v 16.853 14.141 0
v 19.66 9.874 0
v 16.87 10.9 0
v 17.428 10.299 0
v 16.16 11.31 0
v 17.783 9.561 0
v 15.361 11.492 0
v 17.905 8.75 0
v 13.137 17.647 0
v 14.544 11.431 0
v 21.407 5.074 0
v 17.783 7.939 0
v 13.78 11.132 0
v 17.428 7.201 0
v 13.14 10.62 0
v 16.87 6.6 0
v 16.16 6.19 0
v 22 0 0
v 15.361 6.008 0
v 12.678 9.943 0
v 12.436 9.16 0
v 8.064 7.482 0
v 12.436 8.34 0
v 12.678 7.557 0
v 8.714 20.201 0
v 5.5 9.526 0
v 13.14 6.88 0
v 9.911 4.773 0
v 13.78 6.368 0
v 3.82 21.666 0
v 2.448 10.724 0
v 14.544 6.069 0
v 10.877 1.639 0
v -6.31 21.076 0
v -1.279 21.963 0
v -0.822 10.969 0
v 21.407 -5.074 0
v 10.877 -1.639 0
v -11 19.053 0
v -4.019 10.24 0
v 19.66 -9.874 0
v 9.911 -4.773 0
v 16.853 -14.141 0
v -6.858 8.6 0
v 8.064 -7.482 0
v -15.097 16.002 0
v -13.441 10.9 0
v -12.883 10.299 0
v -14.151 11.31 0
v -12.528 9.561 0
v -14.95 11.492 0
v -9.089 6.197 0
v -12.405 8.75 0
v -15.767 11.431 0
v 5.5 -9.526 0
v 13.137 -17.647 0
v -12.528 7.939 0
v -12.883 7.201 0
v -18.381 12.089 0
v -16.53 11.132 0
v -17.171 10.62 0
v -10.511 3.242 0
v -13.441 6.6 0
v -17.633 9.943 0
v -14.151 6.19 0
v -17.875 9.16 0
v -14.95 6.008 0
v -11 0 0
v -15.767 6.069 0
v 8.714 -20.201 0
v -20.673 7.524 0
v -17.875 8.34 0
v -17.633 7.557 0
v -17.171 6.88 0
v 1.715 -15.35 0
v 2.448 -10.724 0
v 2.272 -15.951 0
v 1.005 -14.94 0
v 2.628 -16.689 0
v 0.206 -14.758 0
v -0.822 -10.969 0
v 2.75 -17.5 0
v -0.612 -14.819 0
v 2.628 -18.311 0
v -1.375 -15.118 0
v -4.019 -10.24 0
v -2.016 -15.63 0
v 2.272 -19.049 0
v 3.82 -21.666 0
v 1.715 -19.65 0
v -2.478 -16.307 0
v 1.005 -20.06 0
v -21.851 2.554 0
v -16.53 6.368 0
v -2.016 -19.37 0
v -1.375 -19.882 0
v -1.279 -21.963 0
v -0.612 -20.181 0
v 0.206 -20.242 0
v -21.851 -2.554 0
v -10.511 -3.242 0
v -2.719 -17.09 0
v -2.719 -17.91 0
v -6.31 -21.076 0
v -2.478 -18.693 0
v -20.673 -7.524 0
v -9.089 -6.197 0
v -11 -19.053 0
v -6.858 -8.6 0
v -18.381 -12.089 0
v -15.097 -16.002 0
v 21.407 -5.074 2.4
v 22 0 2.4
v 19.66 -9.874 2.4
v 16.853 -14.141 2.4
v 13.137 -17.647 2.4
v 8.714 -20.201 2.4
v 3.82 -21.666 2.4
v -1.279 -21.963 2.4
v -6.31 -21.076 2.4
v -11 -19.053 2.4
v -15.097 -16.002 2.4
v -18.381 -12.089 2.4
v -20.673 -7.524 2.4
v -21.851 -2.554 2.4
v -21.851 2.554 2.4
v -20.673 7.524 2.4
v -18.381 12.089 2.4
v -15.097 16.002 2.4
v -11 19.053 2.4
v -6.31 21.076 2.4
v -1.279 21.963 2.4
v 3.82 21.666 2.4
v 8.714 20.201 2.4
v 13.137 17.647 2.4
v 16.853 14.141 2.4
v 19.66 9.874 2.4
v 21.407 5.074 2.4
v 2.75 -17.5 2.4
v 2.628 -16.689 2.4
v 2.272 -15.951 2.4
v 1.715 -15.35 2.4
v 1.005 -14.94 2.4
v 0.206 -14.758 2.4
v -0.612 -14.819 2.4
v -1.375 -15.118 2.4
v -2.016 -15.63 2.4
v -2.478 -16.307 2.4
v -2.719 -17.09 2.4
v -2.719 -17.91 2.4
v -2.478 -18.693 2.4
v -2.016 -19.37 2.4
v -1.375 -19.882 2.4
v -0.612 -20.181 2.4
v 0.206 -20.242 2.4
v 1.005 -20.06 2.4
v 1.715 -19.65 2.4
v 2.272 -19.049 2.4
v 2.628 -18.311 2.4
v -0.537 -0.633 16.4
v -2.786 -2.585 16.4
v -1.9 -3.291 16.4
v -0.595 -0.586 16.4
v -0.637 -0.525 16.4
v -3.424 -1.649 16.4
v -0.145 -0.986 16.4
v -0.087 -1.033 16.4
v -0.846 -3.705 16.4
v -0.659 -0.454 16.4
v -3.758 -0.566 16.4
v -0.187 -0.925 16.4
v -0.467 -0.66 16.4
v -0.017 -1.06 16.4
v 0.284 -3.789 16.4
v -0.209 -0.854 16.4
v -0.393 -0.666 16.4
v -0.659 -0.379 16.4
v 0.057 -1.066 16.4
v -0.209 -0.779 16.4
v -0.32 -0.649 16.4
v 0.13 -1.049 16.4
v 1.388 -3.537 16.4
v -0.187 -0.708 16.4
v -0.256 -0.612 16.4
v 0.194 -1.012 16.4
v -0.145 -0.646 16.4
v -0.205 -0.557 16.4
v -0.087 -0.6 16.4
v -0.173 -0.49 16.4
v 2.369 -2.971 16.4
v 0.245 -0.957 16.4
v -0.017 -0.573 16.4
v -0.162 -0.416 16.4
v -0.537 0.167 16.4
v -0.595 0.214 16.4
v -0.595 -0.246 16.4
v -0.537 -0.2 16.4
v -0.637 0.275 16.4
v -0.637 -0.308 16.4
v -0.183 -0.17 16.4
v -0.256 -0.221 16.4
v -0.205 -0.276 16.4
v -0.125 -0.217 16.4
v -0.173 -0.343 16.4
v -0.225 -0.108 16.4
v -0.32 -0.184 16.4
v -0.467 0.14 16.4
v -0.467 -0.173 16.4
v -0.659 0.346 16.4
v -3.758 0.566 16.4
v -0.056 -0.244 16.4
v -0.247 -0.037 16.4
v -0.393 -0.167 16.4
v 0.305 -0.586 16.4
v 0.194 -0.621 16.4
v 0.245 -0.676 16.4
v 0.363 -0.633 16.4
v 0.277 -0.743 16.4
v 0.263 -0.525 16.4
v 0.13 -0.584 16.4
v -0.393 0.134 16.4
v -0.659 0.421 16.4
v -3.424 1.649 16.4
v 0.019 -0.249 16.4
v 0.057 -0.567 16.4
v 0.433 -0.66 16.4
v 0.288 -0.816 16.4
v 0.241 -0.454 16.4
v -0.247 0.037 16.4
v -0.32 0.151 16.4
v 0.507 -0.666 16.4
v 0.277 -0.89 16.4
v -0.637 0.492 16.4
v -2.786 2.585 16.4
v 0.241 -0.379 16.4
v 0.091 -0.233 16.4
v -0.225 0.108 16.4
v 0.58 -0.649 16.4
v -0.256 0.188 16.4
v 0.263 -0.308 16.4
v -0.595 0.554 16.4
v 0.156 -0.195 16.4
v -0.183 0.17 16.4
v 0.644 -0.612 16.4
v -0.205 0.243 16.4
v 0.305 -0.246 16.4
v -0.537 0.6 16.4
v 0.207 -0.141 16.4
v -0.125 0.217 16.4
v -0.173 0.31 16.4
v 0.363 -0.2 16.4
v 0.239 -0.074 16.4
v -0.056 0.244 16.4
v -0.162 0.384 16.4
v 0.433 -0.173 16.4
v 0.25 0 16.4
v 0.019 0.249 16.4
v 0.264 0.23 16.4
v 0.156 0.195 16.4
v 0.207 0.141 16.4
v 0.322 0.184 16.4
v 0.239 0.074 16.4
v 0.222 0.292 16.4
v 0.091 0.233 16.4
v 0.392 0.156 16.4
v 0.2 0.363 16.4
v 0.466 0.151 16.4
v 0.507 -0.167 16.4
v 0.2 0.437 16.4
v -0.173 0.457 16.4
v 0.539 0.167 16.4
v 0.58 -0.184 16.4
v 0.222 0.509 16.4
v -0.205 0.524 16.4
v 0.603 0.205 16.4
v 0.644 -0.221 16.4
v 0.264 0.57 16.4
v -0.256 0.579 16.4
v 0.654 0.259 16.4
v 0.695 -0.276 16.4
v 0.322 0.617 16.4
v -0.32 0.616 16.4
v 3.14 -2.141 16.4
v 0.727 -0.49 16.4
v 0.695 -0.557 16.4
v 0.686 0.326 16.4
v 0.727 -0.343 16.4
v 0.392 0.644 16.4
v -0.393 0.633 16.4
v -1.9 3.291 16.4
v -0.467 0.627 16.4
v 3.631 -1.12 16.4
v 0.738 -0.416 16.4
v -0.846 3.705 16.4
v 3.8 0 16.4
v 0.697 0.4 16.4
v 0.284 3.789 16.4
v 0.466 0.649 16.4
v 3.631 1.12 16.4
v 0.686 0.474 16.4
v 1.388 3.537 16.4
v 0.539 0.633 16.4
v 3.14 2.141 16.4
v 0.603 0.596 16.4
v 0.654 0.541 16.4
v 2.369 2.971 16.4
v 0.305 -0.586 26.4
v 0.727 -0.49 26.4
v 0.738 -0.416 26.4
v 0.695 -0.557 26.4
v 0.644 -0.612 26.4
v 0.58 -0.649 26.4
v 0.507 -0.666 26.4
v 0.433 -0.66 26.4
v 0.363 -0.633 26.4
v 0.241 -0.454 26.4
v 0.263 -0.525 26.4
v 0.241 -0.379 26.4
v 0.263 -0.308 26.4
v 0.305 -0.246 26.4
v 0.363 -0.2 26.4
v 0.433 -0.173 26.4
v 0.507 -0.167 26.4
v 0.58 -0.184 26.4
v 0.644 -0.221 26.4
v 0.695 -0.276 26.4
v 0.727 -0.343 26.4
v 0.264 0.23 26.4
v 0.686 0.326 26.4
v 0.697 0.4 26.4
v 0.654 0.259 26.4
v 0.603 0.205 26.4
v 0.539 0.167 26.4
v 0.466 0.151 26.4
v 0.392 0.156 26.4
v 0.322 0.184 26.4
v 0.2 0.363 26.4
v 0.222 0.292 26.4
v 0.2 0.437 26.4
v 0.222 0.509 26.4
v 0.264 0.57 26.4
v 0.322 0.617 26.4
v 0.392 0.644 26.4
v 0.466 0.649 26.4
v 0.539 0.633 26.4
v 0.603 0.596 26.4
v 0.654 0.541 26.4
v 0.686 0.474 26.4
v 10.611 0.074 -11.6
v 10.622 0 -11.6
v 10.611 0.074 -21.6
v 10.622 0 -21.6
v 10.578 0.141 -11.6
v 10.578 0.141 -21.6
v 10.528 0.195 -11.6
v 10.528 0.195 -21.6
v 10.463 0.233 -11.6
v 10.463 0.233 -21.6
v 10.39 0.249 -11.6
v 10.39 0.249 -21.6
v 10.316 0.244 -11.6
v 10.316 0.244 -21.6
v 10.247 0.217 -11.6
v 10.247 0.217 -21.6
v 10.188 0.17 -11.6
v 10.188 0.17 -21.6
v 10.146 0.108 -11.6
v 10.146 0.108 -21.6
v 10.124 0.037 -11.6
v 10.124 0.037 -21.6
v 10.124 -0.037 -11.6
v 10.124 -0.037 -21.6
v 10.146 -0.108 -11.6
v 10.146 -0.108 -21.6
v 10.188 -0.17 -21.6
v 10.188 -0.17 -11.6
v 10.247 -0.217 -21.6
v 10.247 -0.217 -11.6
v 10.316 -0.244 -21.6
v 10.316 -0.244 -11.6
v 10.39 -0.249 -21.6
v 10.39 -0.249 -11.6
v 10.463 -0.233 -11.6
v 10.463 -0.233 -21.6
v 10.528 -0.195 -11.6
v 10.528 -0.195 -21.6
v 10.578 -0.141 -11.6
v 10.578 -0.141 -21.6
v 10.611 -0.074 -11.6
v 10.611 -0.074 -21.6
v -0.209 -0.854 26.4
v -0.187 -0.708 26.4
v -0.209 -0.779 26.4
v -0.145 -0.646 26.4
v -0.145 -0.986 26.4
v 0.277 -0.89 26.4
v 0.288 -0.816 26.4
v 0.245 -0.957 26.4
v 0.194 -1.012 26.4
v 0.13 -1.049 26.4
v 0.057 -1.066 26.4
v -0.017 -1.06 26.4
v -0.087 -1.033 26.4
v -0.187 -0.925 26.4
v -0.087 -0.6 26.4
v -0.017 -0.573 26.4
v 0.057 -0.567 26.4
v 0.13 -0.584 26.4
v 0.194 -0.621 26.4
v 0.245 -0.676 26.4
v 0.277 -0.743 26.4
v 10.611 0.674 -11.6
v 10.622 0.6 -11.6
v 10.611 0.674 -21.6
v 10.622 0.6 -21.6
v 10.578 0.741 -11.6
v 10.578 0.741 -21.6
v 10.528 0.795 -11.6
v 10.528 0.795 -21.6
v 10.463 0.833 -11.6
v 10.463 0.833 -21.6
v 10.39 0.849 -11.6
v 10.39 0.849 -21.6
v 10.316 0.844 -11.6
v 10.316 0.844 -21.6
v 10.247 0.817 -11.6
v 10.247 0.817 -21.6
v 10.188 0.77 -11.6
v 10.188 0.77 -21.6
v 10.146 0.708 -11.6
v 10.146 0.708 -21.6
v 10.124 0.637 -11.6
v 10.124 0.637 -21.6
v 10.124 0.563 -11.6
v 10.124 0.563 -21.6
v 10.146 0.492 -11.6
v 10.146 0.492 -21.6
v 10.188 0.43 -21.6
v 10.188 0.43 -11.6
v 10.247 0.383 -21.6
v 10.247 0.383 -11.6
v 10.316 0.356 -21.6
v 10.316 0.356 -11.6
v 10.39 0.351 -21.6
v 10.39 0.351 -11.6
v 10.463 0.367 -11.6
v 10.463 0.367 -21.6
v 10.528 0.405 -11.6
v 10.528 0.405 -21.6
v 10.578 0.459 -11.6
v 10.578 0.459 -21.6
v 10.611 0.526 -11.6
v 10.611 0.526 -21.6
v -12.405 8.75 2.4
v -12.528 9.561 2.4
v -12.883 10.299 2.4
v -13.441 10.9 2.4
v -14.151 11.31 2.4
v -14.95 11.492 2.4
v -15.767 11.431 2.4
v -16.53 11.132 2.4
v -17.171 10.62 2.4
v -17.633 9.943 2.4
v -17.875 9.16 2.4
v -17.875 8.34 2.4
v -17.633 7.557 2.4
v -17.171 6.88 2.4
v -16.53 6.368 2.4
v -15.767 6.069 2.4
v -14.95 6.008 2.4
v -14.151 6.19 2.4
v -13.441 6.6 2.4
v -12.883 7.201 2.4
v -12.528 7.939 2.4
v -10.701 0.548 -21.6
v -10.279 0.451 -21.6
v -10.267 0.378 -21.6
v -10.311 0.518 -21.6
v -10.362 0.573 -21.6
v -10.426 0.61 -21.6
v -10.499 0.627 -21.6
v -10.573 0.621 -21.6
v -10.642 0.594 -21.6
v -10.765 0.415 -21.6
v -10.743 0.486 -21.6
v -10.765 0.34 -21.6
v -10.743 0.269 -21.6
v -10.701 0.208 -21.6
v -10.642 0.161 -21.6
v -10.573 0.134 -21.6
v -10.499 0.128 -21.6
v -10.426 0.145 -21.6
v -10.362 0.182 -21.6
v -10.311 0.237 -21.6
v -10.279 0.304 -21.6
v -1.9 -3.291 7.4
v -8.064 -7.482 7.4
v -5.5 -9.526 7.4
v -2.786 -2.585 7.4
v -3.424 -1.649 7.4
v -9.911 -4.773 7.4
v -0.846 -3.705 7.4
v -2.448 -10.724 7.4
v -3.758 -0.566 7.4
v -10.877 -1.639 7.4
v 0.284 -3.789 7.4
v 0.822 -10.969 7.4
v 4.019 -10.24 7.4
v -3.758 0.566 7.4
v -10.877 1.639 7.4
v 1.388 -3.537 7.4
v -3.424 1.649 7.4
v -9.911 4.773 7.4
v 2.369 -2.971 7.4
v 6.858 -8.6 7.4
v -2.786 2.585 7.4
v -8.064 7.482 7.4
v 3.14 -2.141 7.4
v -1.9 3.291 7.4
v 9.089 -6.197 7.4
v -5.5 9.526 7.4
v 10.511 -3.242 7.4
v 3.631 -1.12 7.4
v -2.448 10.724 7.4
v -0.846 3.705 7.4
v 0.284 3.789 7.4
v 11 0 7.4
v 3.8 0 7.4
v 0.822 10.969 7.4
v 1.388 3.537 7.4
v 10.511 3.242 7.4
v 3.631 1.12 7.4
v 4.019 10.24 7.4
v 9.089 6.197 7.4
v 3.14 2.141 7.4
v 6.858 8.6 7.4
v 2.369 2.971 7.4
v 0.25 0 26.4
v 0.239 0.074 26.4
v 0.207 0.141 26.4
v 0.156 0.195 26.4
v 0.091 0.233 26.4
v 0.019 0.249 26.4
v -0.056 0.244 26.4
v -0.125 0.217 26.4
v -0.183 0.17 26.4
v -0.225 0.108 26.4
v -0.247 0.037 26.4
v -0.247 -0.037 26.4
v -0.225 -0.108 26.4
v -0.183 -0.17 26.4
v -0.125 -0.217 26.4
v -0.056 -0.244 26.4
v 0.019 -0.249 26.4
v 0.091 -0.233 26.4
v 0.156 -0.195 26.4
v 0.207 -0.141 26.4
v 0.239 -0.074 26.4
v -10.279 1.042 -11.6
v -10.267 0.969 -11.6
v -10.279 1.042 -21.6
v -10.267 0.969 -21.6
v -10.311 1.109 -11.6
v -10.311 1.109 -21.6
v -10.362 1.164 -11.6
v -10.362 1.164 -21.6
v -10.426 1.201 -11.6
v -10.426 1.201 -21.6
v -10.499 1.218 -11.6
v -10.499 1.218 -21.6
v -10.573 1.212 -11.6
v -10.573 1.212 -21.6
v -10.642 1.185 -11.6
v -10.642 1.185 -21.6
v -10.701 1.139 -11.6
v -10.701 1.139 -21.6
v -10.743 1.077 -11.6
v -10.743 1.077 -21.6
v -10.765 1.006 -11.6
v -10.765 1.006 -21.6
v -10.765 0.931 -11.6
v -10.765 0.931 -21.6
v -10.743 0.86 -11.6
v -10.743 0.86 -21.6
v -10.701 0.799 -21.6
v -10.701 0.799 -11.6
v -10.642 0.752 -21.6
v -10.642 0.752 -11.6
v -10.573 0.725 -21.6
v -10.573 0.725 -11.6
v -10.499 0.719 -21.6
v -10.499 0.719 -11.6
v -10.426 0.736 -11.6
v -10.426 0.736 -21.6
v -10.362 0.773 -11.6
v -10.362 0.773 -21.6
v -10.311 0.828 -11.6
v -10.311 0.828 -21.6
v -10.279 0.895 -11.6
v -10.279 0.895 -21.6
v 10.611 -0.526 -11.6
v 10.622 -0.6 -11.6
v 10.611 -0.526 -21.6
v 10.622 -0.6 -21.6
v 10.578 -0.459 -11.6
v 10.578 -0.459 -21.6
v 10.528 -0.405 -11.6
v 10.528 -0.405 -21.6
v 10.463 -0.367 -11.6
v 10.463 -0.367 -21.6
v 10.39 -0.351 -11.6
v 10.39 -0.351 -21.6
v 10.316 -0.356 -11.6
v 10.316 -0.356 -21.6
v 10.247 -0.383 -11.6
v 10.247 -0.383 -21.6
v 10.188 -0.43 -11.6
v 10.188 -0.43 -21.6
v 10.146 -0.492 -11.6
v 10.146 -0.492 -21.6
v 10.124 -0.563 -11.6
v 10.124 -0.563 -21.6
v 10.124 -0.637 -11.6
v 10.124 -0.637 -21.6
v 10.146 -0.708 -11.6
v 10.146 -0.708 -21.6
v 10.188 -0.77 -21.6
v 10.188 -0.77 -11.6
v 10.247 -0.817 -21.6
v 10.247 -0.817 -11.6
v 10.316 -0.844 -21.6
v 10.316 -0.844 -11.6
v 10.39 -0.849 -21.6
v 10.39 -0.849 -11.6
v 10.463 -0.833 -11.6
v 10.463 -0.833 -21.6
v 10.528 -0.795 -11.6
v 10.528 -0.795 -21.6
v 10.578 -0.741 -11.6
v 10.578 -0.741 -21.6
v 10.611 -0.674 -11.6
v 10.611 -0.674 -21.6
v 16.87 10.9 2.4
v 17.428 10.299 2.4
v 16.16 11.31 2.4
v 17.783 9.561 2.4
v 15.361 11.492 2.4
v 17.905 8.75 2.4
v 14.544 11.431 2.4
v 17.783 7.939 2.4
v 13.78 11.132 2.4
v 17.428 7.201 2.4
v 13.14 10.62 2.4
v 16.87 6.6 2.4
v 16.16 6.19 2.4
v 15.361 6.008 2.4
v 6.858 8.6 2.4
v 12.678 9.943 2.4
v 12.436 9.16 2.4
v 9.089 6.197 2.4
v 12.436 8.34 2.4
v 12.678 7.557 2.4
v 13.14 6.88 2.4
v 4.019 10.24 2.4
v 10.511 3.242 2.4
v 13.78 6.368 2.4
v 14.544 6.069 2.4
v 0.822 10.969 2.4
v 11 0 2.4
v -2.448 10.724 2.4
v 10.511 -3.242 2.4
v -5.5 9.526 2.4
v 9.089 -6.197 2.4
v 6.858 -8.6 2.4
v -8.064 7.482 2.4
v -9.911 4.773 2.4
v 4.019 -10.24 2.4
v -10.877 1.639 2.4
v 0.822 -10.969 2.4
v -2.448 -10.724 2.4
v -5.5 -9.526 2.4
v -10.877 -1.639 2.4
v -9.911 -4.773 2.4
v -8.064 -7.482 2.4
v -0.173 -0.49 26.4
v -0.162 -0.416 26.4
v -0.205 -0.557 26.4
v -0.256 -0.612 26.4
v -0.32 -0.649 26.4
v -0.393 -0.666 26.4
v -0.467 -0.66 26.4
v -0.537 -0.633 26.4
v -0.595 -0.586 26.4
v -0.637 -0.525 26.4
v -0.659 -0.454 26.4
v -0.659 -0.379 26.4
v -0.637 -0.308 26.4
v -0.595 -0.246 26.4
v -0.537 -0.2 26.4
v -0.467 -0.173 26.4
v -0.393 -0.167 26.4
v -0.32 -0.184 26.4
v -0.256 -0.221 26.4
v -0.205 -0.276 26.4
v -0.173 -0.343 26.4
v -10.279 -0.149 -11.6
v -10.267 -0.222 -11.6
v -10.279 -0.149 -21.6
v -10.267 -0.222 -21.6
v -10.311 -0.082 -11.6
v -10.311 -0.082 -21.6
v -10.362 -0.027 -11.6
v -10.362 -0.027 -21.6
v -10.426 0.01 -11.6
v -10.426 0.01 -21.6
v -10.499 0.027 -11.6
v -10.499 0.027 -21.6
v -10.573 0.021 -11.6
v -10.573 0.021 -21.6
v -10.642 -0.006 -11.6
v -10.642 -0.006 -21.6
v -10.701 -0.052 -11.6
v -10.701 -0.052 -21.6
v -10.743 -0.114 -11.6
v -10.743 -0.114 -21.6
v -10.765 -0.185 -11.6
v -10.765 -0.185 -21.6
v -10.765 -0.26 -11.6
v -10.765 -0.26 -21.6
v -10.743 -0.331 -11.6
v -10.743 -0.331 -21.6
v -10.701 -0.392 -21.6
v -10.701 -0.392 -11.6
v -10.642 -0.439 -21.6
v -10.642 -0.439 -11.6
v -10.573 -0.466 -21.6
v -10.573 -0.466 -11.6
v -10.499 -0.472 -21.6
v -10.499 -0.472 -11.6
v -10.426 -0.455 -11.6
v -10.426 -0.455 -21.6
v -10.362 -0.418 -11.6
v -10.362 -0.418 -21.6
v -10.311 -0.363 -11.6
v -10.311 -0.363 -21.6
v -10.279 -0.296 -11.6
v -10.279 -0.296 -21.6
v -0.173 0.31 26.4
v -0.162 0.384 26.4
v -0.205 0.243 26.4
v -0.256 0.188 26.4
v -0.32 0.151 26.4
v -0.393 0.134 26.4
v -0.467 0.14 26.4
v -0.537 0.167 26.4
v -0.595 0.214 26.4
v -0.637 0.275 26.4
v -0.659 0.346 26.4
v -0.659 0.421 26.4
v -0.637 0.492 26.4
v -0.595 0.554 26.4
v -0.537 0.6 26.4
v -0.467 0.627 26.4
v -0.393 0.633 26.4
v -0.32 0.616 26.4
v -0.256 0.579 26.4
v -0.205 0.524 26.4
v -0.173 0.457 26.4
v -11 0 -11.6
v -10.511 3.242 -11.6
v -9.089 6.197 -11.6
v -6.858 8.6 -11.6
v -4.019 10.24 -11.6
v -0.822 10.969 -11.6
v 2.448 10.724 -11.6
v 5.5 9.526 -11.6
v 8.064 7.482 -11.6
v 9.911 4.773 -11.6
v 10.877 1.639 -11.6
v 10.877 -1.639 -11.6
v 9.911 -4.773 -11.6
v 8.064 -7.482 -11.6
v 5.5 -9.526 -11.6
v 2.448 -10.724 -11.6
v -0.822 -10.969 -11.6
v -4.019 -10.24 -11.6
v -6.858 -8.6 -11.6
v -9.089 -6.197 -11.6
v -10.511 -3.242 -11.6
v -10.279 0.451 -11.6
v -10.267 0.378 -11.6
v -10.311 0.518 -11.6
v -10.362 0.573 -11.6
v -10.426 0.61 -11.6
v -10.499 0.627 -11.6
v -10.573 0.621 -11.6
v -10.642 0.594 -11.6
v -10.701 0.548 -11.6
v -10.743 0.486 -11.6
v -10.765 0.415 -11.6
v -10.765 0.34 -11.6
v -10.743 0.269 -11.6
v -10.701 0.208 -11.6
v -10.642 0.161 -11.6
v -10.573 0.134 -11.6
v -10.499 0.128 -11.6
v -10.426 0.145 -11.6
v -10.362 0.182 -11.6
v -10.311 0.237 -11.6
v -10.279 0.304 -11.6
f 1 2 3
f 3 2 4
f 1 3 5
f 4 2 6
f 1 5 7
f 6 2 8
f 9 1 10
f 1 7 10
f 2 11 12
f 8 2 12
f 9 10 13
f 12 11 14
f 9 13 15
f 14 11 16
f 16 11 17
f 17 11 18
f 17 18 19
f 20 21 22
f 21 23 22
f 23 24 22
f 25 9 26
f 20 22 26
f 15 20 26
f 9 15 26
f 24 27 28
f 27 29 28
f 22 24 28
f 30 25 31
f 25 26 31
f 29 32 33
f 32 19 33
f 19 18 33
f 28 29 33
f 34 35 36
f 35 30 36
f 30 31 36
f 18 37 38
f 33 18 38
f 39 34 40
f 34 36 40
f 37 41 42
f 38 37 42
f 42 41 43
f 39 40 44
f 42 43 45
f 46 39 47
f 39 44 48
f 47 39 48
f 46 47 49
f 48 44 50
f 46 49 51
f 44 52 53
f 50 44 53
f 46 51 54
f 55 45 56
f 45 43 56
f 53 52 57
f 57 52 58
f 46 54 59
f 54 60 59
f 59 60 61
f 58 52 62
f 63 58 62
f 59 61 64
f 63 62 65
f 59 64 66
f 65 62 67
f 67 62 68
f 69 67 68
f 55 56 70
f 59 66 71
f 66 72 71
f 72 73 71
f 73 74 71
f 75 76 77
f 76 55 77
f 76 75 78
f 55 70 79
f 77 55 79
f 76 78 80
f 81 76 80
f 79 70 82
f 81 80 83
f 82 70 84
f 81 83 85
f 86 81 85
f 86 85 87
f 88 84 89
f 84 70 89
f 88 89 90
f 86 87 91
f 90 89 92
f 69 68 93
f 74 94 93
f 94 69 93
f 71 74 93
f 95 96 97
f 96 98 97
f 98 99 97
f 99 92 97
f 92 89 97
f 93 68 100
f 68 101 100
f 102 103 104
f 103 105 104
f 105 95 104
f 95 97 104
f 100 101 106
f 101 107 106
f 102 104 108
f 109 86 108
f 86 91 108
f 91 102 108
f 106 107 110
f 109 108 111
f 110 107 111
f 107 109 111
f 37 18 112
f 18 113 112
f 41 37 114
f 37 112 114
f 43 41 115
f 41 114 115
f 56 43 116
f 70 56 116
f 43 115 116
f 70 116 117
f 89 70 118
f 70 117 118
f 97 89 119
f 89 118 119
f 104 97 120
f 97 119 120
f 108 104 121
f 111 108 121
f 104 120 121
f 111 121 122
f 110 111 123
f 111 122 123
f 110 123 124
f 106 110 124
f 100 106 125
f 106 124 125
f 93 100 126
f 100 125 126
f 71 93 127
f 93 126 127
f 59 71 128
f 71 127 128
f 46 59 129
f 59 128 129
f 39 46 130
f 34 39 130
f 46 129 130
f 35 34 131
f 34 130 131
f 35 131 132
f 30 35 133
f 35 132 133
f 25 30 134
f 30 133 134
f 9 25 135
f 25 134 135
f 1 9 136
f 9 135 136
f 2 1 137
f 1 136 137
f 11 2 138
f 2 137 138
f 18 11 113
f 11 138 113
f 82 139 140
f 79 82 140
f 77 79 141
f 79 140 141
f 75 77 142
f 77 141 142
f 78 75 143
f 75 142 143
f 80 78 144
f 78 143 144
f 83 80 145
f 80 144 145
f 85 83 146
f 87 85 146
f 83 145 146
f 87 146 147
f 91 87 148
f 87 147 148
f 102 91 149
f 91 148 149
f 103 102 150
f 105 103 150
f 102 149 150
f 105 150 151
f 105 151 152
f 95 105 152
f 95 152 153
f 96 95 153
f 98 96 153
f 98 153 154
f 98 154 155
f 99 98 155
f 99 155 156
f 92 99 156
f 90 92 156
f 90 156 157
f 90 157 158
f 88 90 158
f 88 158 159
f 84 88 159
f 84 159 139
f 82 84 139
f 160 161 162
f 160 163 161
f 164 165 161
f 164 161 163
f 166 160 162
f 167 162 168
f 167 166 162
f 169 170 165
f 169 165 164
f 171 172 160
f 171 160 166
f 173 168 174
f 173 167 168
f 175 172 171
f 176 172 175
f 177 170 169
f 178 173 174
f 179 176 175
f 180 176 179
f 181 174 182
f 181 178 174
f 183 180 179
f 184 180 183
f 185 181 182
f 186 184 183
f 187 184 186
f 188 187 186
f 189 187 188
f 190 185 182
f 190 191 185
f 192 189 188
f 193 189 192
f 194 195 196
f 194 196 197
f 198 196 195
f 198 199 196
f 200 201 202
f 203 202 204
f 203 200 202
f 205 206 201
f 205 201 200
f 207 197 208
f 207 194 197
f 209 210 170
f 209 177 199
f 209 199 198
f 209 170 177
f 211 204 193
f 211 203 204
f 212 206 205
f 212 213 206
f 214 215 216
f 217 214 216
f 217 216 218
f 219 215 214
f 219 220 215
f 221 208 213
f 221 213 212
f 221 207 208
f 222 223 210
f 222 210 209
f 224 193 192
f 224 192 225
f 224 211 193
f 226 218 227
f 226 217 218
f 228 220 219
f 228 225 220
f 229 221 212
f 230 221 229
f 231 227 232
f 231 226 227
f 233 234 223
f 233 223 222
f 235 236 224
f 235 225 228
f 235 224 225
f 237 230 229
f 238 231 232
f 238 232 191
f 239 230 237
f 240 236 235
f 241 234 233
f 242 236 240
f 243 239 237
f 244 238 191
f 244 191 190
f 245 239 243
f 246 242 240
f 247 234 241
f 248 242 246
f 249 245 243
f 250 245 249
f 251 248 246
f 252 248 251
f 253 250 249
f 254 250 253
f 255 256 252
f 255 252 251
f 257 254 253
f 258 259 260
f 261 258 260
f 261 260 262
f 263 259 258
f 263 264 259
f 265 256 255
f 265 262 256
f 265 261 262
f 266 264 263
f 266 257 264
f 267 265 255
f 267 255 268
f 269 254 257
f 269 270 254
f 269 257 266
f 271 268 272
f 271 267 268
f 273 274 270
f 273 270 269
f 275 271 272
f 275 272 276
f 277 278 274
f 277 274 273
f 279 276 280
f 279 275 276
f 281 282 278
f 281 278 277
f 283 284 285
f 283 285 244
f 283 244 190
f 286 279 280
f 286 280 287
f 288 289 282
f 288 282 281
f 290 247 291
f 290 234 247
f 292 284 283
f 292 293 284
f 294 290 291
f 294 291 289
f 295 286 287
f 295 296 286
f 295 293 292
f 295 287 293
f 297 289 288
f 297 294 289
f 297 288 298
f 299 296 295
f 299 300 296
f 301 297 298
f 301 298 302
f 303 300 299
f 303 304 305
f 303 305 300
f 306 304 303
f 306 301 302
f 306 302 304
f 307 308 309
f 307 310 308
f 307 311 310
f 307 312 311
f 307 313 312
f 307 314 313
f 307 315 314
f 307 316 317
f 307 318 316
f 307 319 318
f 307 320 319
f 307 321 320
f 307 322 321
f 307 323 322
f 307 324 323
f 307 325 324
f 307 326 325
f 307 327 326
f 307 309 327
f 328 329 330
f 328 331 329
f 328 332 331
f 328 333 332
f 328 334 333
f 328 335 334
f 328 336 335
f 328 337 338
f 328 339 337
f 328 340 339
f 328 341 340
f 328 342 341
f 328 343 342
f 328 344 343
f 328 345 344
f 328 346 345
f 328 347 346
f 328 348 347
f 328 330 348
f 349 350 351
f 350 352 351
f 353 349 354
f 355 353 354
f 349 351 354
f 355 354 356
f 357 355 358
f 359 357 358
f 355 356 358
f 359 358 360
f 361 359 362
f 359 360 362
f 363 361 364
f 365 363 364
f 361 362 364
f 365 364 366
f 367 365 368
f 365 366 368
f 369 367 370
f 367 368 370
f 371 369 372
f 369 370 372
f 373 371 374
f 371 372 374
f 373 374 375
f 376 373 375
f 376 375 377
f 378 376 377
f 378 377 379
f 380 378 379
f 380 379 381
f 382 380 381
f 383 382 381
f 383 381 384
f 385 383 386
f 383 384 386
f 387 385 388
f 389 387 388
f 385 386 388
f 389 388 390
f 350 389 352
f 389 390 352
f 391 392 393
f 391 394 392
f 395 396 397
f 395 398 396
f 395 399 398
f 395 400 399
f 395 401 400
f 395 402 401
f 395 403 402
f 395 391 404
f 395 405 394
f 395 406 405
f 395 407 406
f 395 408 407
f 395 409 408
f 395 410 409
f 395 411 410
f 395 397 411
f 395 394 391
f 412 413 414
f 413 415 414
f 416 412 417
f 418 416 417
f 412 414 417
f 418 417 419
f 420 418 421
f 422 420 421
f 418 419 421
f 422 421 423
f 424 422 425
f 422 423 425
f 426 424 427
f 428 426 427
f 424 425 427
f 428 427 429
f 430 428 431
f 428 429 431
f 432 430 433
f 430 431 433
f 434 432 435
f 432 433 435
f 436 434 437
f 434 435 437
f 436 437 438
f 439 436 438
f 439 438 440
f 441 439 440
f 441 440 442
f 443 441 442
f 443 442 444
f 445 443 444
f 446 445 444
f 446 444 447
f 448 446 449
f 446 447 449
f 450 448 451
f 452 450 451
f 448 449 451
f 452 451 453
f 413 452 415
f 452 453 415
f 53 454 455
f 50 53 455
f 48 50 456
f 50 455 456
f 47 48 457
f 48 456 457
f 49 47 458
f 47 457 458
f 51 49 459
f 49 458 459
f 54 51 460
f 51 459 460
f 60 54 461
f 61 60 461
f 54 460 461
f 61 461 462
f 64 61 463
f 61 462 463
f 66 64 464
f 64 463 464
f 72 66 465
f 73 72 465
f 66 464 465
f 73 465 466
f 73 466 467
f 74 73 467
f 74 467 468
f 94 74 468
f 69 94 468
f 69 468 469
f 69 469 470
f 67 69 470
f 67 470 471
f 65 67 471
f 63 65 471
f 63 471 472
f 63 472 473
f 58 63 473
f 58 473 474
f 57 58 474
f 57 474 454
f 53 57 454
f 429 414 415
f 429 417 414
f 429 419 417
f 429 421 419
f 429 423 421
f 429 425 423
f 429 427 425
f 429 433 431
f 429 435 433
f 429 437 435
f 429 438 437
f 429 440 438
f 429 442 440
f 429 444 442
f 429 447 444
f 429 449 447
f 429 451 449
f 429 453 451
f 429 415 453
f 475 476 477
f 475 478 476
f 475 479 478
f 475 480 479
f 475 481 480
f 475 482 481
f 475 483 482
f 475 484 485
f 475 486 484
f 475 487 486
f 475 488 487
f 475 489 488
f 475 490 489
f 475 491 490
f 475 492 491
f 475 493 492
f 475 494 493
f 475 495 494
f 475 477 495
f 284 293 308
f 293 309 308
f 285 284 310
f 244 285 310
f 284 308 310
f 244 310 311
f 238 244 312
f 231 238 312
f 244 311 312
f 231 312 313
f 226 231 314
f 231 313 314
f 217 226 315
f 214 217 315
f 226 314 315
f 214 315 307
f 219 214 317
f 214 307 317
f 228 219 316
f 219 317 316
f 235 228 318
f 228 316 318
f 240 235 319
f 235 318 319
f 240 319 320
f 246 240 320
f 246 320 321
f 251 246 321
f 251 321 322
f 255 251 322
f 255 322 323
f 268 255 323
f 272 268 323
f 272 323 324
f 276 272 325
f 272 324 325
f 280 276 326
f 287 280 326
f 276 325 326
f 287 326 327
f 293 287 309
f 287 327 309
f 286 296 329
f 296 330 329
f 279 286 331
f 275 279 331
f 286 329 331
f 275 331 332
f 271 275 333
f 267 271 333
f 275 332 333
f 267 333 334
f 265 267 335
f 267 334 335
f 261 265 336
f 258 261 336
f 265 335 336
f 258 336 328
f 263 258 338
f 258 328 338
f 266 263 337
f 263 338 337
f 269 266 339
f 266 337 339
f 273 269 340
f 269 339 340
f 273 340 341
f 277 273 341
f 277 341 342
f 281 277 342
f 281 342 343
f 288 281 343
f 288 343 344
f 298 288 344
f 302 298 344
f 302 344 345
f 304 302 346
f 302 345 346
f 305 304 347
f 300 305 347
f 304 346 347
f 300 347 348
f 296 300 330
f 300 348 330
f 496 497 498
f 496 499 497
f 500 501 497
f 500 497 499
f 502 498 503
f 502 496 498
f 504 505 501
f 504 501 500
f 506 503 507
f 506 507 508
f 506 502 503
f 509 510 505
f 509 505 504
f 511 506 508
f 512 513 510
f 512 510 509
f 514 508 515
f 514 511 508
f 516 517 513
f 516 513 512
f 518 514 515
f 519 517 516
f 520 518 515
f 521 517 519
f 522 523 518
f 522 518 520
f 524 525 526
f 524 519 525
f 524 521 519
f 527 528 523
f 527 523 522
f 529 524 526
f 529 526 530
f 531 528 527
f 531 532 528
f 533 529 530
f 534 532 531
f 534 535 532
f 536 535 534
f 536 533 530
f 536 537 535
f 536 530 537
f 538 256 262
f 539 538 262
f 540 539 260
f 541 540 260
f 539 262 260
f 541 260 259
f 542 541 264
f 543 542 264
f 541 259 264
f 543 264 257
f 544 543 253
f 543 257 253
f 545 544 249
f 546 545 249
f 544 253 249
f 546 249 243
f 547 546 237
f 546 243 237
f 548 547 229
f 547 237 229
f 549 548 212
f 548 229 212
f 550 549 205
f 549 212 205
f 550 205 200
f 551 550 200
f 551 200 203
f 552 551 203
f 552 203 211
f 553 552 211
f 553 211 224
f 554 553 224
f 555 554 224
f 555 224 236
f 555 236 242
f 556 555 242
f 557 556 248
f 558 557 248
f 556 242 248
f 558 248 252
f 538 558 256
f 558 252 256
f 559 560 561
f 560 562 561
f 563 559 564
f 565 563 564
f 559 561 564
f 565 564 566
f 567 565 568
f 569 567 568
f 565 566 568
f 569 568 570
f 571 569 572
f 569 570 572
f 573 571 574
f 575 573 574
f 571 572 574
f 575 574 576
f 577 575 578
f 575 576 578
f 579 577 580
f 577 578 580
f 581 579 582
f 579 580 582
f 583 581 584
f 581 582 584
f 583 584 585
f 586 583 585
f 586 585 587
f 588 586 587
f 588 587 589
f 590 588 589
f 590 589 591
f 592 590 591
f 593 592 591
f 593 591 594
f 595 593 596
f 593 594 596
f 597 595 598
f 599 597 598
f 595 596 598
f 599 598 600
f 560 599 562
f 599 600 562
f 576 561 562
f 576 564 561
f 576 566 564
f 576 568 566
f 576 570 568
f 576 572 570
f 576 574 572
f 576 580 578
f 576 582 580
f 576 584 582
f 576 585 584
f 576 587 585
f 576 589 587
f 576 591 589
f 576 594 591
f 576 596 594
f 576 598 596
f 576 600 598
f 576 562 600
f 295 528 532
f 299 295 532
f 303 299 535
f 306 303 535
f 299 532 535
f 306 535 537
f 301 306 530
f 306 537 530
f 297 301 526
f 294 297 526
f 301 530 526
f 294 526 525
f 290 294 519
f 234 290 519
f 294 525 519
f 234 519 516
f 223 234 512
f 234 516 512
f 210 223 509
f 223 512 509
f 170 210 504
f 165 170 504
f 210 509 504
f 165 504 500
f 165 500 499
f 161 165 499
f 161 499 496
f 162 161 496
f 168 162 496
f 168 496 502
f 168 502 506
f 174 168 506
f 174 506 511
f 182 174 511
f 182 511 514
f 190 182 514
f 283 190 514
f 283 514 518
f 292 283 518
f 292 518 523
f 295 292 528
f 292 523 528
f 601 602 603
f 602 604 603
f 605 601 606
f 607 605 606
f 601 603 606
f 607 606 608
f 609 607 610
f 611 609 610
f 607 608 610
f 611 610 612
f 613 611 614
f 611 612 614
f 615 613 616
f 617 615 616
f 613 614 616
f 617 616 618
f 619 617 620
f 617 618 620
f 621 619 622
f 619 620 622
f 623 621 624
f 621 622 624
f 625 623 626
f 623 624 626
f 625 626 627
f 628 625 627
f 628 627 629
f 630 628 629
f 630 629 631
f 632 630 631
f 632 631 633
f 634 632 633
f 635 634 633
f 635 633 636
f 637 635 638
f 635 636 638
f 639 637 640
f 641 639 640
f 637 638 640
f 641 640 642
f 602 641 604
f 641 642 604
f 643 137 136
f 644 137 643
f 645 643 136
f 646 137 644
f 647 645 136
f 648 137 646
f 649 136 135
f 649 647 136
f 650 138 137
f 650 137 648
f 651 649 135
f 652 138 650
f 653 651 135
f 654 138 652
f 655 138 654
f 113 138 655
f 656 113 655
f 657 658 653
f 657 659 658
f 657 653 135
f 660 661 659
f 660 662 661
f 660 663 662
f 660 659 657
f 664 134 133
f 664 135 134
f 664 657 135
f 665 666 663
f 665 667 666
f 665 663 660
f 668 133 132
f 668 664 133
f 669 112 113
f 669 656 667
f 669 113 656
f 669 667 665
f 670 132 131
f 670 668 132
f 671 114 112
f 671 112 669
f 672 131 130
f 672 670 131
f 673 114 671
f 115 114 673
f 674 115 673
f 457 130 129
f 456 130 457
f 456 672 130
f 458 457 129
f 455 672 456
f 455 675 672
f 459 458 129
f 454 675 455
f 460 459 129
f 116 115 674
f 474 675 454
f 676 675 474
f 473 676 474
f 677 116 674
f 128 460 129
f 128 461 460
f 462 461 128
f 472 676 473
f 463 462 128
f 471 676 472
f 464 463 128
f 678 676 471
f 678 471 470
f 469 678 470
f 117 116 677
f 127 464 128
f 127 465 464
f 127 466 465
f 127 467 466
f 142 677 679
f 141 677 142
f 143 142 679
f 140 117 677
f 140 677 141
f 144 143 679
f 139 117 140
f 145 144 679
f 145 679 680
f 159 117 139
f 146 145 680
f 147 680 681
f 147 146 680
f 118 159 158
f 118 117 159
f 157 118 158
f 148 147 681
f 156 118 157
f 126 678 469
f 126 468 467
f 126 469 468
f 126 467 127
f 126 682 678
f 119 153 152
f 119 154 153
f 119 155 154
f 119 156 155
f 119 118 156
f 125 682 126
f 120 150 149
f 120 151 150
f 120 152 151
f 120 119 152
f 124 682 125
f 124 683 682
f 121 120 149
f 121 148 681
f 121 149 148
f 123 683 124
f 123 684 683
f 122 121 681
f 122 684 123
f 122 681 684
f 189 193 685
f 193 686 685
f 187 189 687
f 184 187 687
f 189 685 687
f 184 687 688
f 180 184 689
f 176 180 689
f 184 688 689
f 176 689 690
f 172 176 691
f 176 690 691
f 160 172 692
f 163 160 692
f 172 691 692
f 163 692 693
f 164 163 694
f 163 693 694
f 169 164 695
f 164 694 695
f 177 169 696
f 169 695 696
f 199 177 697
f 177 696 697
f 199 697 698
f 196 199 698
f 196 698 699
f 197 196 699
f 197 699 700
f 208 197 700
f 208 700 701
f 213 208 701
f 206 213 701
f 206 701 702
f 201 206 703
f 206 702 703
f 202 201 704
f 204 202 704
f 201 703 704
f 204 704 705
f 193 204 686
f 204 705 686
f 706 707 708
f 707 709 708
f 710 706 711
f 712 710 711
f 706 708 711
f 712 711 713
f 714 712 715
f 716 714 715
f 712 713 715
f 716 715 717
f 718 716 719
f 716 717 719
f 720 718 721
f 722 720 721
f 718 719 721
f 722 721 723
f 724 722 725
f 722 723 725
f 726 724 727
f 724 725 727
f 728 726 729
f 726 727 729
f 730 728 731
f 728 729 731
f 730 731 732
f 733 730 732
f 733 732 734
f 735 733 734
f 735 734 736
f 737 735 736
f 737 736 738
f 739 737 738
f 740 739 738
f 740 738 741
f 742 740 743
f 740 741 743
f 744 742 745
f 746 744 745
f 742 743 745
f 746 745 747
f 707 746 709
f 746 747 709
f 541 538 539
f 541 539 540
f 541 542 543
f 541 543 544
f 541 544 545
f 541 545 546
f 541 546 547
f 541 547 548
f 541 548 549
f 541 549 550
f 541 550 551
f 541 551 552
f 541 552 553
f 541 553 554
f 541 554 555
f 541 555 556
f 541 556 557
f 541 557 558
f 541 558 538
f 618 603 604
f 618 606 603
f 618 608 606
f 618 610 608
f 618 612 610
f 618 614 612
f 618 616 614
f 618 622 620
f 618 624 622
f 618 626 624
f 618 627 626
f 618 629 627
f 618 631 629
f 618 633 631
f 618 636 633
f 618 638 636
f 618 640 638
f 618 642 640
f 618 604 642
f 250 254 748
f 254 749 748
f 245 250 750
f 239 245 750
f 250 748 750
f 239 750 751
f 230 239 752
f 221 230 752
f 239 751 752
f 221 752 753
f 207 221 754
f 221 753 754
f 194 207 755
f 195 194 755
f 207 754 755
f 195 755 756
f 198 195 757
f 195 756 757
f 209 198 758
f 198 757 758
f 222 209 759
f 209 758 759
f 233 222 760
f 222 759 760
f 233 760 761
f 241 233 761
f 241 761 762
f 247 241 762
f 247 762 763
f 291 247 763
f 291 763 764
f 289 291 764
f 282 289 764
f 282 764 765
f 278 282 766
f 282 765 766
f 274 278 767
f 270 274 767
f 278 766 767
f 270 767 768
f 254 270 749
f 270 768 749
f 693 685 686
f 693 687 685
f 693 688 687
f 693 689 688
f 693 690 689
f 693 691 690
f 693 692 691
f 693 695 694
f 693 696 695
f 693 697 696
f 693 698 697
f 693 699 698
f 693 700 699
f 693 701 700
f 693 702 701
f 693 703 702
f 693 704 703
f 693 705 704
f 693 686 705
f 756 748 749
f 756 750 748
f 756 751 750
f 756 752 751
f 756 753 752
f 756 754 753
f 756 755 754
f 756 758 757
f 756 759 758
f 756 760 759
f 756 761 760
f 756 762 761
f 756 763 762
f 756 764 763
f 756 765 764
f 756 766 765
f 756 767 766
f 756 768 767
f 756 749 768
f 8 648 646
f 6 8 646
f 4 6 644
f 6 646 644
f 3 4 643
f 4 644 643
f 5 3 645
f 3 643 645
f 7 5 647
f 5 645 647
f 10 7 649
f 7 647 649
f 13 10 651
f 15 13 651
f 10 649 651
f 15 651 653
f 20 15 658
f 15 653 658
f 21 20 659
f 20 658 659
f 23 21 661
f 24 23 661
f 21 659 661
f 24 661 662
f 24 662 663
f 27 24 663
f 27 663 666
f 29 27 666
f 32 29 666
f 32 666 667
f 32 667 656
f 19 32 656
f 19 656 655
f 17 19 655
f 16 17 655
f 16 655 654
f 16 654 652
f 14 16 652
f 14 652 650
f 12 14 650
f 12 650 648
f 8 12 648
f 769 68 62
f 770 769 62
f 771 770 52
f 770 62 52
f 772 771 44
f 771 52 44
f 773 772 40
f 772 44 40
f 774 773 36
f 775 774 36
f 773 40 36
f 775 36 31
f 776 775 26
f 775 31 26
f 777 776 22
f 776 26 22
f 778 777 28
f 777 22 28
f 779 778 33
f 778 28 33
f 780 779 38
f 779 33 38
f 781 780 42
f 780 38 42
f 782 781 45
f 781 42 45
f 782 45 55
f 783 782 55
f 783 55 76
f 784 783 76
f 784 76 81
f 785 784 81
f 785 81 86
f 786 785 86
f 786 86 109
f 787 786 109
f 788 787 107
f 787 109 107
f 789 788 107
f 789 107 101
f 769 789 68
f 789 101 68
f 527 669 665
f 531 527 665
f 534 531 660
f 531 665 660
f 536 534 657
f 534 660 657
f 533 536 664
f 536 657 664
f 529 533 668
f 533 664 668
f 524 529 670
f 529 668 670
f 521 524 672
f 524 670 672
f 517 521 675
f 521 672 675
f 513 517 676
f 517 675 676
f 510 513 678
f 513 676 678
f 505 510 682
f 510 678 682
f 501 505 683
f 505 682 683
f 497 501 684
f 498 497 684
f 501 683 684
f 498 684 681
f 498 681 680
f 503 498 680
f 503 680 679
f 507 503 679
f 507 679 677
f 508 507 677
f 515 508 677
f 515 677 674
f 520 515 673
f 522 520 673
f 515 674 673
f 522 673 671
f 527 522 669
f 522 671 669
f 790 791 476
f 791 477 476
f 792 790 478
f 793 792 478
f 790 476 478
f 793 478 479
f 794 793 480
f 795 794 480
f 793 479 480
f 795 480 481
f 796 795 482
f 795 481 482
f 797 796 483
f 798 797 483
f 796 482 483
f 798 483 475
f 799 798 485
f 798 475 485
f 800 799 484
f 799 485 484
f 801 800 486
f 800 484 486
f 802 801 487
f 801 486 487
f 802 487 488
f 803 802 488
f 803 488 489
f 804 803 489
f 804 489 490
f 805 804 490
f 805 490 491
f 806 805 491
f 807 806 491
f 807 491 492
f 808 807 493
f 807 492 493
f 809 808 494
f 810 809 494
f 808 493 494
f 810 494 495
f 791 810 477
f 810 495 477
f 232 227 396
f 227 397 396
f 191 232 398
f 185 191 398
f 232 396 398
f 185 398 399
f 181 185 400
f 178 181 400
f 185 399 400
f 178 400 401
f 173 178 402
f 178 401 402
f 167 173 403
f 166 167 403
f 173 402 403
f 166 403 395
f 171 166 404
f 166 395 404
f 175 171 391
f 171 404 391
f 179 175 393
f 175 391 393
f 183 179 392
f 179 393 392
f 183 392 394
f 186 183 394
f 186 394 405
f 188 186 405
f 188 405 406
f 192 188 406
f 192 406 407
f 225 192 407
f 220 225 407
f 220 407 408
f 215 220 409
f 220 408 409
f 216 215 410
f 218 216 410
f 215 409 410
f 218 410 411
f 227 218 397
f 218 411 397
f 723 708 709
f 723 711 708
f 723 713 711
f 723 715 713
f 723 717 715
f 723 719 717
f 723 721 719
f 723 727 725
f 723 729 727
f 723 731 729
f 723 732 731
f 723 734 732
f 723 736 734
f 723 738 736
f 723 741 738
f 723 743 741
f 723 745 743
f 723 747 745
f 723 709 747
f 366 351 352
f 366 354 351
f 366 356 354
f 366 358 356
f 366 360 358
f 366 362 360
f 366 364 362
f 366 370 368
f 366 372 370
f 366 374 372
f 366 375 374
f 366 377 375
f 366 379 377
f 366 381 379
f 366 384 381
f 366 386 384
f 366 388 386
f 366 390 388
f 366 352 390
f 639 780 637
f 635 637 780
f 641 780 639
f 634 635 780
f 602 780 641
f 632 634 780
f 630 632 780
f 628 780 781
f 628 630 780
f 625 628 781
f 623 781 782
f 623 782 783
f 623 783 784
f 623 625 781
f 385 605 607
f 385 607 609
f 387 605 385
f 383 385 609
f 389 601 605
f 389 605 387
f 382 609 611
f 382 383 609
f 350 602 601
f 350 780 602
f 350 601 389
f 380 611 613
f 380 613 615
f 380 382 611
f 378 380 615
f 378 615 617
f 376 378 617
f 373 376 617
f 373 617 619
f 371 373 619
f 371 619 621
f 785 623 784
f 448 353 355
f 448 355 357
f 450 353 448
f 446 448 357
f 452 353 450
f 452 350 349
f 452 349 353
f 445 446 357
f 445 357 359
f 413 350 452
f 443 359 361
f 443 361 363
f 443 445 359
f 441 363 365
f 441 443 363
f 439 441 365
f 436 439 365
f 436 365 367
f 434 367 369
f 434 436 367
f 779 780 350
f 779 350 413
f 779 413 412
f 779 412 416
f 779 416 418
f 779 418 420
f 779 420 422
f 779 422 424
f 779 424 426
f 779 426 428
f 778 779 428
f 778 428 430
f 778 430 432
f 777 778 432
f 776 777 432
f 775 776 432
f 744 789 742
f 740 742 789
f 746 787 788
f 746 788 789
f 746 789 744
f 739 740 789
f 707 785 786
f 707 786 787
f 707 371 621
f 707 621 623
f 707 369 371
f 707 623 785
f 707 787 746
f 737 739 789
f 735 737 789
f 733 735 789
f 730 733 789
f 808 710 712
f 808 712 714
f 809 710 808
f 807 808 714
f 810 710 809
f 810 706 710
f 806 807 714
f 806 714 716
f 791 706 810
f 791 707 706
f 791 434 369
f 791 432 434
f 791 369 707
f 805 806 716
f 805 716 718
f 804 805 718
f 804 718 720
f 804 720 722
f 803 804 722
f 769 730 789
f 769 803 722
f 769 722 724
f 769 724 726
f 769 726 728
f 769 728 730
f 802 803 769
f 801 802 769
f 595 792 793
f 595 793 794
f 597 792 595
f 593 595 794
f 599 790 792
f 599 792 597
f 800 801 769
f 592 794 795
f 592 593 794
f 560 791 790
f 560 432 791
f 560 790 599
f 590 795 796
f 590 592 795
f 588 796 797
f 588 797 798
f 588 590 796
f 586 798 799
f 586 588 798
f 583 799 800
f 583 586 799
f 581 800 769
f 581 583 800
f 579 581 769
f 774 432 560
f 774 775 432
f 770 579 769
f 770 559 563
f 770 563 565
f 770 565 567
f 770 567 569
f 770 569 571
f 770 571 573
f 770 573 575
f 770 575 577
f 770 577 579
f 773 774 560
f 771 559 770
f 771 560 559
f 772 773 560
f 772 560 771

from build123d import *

# Parameters (mm, degrees)
SKETCH1_W                      = 22
SKETCH1_H                      = 2.4
SKETCH2_R                      = 11
BOSS_EXTRUDE1_DEPTH            = 5
SKETCH3_R                      = 3.8
BOSS_EXTRUDE2_DEPTH            = 9
SKETCH4_R                      = 0.25
BOSS_EXTRUDE3_DEPTH            = 10
SKETCH5_R                      = 11
BOSS_EXTRUDE4_DEPTH            = 11.6
SKETCH6_W                      = 0.25
SKETCH6_H                      = 10
SKETCH7_W                      = 0.25
SKETCH7_H                      = 10
SKETCH8_W                      = 0.25
SKETCH8_H                      = 10
SKETCH9_W                      = 0.25
SKETCH9_H                      = 10
SKETCH10_W                     = 0.25
SKETCH10_H                     = 10
SKETCH11_W                     = 0.25
SKETCH11_H                     = 10
SKETCH12_W                     = 0.25
SKETCH12_H                     = 10
SKETCH13_W                     = 0.25
SKETCH13_H                     = 10
SKETCH14_W                     = 0.25
SKETCH14_H                     = 10
SKETCH15_W                     = 0.25
SKETCH15_H                     = 10
SKETCH16_W                     = 0.25
SKETCH16_H                     = 10
F_5_5_5_5_DIAMETER_HOLE1_D     = 5.5
F_5_5_5_5_DIAMETER_HOLE1_DEPTH = 26.4


with BuildPart() as part:
    # Sketch1 → Revolve1 (revolve)
    with BuildSketch(Plane.XZ):
        with Locations((11, 1.2)):
            Rectangle(SKETCH1_W, SKETCH1_H)
    revolve(axis=Axis((0, 0, 2.4), (0, 0, -1)))

    # Sketch2 → Boss-Extrude1 (add)
    with BuildSketch(Plane.XY.offset(2.4)):
        Circle(SKETCH2_R)
    extrude(amount=BOSS_EXTRUDE1_DEPTH)

    # Sketch3 → Boss-Extrude2 (add)
    with BuildSketch(Plane.XY.offset(7.4)):
        Circle(SKETCH3_R)
    extrude(amount=BOSS_EXTRUDE2_DEPTH)

    # Sketch4 → Boss-Extrude3 (add)
    with BuildSketch(Plane.XY.offset(16.4)):
        Circle(SKETCH4_R)
    extrude(amount=BOSS_EXTRUDE3_DEPTH)

    # Sketch5 → Boss-Extrude4 (add)
    with BuildSketch(Plane(origin=(0, 0, 0), x_dir=(-1, 0, 0), z_dir=(0, 0, -1))):
        Circle(SKETCH5_R)
    extrude(amount=BOSS_EXTRUDE4_DEPTH)

    # Sketch6 → Revolve2 (revolve)
    with BuildSketch(Plane.XZ.offset(0.816347149)):
        with Locations((0.163253006, 21.4)):
            Rectangle(SKETCH6_W, SKETCH6_H)
    revolve(axis=Axis((0.038253006, -0.816347149, 26.4), (0, 0, -1)))

    # Sketch7 → Revolve3 (revolve)
    with BuildSketch(Plane.XZ.offset(0.416347149)):
        with Locations((0.613253006, 21.4)):
            Rectangle(SKETCH7_W, SKETCH7_H)
    revolve(axis=Axis((0.488253006, -0.416347149, 26.4), (0, 0, -1)))

    # Sketch8 → Revolve4 (revolve)
    with BuildSketch(Plane.XZ.offset(-0.383652851)):
        with Locations((-0.286746994, 21.4)):
            Rectangle(SKETCH8_W, SKETCH8_H)
    revolve(axis=Axis((-0.411746994, 0.383652851, 26.4), (0, 0, -1)))

    # Sketch9 → Revolve5 (revolve)
    with BuildSketch(Plane.XZ.offset(-0.400094572)):
        with Locations((0.572352369, 21.4)):
            Rectangle(SKETCH9_W, SKETCH9_H)
    revolve(axis=Axis((0.447352369, 0.400094572, 26.4), (0, 0, -1)))

    # Sketch10 → Revolve6 (revolve)
    with BuildSketch(Plane(origin=(0, -0.222432877, 0), x_dir=(1, 0, 0), z_dir=(0, 1, 0))):
        with Locations((-10.392433295, 16.6)):
            Rectangle(SKETCH10_W, SKETCH10_H)
    revolve(axis=Axis((-10.517433295, -0.222432877, -21.6), (0, 0, 1)))

    # Sketch11 → Revolve7 (revolve)
    with BuildSketch(Plane(origin=(0, 0.377567123, 0), x_dir=(1, 0, 0), z_dir=(0, 1, 0))):
        with Locations((-10.392433295, 16.6)):
            Rectangle(SKETCH11_W, SKETCH11_H)
    revolve(axis=Axis((-10.517433295, 0.377567123, -21.6), (0, 0, 1)))

    # Sketch12 → Revolve8 (revolve)
    with BuildSketch(Plane(origin=(0, 0.6, 0), x_dir=(1, 0, 0), z_dir=(0, 1, 0))):
        with Locations((10.496693215, 16.6)):
            Rectangle(SKETCH12_W, SKETCH12_H)
    revolve(axis=Axis((10.371693215, 0.6, -21.6), (0, 0, 1)))

    # Sketch13 → Revolve9 (revolve)
    with BuildSketch(Plane(origin=(0, 0, 0), x_dir=(1, 0, 0), z_dir=(0, 1, 0))):
        with Locations((10.496693215, 16.6)):
            Rectangle(SKETCH13_W, SKETCH13_H)
    revolve(axis=Axis((10.371693215, 0, -21.6), (0, 0, 1)))

    # Sketch14 → Revolve10 (revolve)
    with BuildSketch(Plane(origin=(0, -0.6, 0), x_dir=(1, 0, 0), z_dir=(0, 1, 0))):
        with Locations((10.496693215, 16.6)):
            Rectangle(SKETCH14_W, SKETCH14_H)
    revolve(axis=Axis((10.371693215, -0.6, -21.6), (0, 0, 1)))

    # Sketch15 → Revolve11 (revolve)
    with BuildSketch(Plane(origin=(0, 0.968647222, 0), x_dir=(1, 0, 0), z_dir=(0, 1, 0))):
        with Locations((-10.392433295, 16.6)):
            Rectangle(SKETCH15_W, SKETCH15_H)
    revolve(axis=Axis((-10.517433295, 0.968647222, -21.6), (0, 0, 1)))

    # Sketch16 → Revolve12 (revolve)
    with BuildSketch(Plane.XZ.offset(0.416347149)):
        with Locations((-0.286746994, 21.4)):
            Rectangle(SKETCH16_W, SKETCH16_H)
    revolve(axis=Axis((-0.411746994, -0.416347149, 26.4), (0, 0, -1)))

    # Ø5.5 (5.5) Diameter Hole1
    with Locations(Plane(origin=(0, 0, 0), x_dir=(-1, 0, 0), z_dir=(0, 0, -1))):
        with Locations((-15.155444566, 8.75), (15.155444566, 8.75), (0, -17.5)):
            Hole(F_5_5_5_5_DIAMETER_HOLE1_D / 2, depth=F_5_5_5_5_DIAMETER_HOLE1_DEPTH)


solid = part.part
